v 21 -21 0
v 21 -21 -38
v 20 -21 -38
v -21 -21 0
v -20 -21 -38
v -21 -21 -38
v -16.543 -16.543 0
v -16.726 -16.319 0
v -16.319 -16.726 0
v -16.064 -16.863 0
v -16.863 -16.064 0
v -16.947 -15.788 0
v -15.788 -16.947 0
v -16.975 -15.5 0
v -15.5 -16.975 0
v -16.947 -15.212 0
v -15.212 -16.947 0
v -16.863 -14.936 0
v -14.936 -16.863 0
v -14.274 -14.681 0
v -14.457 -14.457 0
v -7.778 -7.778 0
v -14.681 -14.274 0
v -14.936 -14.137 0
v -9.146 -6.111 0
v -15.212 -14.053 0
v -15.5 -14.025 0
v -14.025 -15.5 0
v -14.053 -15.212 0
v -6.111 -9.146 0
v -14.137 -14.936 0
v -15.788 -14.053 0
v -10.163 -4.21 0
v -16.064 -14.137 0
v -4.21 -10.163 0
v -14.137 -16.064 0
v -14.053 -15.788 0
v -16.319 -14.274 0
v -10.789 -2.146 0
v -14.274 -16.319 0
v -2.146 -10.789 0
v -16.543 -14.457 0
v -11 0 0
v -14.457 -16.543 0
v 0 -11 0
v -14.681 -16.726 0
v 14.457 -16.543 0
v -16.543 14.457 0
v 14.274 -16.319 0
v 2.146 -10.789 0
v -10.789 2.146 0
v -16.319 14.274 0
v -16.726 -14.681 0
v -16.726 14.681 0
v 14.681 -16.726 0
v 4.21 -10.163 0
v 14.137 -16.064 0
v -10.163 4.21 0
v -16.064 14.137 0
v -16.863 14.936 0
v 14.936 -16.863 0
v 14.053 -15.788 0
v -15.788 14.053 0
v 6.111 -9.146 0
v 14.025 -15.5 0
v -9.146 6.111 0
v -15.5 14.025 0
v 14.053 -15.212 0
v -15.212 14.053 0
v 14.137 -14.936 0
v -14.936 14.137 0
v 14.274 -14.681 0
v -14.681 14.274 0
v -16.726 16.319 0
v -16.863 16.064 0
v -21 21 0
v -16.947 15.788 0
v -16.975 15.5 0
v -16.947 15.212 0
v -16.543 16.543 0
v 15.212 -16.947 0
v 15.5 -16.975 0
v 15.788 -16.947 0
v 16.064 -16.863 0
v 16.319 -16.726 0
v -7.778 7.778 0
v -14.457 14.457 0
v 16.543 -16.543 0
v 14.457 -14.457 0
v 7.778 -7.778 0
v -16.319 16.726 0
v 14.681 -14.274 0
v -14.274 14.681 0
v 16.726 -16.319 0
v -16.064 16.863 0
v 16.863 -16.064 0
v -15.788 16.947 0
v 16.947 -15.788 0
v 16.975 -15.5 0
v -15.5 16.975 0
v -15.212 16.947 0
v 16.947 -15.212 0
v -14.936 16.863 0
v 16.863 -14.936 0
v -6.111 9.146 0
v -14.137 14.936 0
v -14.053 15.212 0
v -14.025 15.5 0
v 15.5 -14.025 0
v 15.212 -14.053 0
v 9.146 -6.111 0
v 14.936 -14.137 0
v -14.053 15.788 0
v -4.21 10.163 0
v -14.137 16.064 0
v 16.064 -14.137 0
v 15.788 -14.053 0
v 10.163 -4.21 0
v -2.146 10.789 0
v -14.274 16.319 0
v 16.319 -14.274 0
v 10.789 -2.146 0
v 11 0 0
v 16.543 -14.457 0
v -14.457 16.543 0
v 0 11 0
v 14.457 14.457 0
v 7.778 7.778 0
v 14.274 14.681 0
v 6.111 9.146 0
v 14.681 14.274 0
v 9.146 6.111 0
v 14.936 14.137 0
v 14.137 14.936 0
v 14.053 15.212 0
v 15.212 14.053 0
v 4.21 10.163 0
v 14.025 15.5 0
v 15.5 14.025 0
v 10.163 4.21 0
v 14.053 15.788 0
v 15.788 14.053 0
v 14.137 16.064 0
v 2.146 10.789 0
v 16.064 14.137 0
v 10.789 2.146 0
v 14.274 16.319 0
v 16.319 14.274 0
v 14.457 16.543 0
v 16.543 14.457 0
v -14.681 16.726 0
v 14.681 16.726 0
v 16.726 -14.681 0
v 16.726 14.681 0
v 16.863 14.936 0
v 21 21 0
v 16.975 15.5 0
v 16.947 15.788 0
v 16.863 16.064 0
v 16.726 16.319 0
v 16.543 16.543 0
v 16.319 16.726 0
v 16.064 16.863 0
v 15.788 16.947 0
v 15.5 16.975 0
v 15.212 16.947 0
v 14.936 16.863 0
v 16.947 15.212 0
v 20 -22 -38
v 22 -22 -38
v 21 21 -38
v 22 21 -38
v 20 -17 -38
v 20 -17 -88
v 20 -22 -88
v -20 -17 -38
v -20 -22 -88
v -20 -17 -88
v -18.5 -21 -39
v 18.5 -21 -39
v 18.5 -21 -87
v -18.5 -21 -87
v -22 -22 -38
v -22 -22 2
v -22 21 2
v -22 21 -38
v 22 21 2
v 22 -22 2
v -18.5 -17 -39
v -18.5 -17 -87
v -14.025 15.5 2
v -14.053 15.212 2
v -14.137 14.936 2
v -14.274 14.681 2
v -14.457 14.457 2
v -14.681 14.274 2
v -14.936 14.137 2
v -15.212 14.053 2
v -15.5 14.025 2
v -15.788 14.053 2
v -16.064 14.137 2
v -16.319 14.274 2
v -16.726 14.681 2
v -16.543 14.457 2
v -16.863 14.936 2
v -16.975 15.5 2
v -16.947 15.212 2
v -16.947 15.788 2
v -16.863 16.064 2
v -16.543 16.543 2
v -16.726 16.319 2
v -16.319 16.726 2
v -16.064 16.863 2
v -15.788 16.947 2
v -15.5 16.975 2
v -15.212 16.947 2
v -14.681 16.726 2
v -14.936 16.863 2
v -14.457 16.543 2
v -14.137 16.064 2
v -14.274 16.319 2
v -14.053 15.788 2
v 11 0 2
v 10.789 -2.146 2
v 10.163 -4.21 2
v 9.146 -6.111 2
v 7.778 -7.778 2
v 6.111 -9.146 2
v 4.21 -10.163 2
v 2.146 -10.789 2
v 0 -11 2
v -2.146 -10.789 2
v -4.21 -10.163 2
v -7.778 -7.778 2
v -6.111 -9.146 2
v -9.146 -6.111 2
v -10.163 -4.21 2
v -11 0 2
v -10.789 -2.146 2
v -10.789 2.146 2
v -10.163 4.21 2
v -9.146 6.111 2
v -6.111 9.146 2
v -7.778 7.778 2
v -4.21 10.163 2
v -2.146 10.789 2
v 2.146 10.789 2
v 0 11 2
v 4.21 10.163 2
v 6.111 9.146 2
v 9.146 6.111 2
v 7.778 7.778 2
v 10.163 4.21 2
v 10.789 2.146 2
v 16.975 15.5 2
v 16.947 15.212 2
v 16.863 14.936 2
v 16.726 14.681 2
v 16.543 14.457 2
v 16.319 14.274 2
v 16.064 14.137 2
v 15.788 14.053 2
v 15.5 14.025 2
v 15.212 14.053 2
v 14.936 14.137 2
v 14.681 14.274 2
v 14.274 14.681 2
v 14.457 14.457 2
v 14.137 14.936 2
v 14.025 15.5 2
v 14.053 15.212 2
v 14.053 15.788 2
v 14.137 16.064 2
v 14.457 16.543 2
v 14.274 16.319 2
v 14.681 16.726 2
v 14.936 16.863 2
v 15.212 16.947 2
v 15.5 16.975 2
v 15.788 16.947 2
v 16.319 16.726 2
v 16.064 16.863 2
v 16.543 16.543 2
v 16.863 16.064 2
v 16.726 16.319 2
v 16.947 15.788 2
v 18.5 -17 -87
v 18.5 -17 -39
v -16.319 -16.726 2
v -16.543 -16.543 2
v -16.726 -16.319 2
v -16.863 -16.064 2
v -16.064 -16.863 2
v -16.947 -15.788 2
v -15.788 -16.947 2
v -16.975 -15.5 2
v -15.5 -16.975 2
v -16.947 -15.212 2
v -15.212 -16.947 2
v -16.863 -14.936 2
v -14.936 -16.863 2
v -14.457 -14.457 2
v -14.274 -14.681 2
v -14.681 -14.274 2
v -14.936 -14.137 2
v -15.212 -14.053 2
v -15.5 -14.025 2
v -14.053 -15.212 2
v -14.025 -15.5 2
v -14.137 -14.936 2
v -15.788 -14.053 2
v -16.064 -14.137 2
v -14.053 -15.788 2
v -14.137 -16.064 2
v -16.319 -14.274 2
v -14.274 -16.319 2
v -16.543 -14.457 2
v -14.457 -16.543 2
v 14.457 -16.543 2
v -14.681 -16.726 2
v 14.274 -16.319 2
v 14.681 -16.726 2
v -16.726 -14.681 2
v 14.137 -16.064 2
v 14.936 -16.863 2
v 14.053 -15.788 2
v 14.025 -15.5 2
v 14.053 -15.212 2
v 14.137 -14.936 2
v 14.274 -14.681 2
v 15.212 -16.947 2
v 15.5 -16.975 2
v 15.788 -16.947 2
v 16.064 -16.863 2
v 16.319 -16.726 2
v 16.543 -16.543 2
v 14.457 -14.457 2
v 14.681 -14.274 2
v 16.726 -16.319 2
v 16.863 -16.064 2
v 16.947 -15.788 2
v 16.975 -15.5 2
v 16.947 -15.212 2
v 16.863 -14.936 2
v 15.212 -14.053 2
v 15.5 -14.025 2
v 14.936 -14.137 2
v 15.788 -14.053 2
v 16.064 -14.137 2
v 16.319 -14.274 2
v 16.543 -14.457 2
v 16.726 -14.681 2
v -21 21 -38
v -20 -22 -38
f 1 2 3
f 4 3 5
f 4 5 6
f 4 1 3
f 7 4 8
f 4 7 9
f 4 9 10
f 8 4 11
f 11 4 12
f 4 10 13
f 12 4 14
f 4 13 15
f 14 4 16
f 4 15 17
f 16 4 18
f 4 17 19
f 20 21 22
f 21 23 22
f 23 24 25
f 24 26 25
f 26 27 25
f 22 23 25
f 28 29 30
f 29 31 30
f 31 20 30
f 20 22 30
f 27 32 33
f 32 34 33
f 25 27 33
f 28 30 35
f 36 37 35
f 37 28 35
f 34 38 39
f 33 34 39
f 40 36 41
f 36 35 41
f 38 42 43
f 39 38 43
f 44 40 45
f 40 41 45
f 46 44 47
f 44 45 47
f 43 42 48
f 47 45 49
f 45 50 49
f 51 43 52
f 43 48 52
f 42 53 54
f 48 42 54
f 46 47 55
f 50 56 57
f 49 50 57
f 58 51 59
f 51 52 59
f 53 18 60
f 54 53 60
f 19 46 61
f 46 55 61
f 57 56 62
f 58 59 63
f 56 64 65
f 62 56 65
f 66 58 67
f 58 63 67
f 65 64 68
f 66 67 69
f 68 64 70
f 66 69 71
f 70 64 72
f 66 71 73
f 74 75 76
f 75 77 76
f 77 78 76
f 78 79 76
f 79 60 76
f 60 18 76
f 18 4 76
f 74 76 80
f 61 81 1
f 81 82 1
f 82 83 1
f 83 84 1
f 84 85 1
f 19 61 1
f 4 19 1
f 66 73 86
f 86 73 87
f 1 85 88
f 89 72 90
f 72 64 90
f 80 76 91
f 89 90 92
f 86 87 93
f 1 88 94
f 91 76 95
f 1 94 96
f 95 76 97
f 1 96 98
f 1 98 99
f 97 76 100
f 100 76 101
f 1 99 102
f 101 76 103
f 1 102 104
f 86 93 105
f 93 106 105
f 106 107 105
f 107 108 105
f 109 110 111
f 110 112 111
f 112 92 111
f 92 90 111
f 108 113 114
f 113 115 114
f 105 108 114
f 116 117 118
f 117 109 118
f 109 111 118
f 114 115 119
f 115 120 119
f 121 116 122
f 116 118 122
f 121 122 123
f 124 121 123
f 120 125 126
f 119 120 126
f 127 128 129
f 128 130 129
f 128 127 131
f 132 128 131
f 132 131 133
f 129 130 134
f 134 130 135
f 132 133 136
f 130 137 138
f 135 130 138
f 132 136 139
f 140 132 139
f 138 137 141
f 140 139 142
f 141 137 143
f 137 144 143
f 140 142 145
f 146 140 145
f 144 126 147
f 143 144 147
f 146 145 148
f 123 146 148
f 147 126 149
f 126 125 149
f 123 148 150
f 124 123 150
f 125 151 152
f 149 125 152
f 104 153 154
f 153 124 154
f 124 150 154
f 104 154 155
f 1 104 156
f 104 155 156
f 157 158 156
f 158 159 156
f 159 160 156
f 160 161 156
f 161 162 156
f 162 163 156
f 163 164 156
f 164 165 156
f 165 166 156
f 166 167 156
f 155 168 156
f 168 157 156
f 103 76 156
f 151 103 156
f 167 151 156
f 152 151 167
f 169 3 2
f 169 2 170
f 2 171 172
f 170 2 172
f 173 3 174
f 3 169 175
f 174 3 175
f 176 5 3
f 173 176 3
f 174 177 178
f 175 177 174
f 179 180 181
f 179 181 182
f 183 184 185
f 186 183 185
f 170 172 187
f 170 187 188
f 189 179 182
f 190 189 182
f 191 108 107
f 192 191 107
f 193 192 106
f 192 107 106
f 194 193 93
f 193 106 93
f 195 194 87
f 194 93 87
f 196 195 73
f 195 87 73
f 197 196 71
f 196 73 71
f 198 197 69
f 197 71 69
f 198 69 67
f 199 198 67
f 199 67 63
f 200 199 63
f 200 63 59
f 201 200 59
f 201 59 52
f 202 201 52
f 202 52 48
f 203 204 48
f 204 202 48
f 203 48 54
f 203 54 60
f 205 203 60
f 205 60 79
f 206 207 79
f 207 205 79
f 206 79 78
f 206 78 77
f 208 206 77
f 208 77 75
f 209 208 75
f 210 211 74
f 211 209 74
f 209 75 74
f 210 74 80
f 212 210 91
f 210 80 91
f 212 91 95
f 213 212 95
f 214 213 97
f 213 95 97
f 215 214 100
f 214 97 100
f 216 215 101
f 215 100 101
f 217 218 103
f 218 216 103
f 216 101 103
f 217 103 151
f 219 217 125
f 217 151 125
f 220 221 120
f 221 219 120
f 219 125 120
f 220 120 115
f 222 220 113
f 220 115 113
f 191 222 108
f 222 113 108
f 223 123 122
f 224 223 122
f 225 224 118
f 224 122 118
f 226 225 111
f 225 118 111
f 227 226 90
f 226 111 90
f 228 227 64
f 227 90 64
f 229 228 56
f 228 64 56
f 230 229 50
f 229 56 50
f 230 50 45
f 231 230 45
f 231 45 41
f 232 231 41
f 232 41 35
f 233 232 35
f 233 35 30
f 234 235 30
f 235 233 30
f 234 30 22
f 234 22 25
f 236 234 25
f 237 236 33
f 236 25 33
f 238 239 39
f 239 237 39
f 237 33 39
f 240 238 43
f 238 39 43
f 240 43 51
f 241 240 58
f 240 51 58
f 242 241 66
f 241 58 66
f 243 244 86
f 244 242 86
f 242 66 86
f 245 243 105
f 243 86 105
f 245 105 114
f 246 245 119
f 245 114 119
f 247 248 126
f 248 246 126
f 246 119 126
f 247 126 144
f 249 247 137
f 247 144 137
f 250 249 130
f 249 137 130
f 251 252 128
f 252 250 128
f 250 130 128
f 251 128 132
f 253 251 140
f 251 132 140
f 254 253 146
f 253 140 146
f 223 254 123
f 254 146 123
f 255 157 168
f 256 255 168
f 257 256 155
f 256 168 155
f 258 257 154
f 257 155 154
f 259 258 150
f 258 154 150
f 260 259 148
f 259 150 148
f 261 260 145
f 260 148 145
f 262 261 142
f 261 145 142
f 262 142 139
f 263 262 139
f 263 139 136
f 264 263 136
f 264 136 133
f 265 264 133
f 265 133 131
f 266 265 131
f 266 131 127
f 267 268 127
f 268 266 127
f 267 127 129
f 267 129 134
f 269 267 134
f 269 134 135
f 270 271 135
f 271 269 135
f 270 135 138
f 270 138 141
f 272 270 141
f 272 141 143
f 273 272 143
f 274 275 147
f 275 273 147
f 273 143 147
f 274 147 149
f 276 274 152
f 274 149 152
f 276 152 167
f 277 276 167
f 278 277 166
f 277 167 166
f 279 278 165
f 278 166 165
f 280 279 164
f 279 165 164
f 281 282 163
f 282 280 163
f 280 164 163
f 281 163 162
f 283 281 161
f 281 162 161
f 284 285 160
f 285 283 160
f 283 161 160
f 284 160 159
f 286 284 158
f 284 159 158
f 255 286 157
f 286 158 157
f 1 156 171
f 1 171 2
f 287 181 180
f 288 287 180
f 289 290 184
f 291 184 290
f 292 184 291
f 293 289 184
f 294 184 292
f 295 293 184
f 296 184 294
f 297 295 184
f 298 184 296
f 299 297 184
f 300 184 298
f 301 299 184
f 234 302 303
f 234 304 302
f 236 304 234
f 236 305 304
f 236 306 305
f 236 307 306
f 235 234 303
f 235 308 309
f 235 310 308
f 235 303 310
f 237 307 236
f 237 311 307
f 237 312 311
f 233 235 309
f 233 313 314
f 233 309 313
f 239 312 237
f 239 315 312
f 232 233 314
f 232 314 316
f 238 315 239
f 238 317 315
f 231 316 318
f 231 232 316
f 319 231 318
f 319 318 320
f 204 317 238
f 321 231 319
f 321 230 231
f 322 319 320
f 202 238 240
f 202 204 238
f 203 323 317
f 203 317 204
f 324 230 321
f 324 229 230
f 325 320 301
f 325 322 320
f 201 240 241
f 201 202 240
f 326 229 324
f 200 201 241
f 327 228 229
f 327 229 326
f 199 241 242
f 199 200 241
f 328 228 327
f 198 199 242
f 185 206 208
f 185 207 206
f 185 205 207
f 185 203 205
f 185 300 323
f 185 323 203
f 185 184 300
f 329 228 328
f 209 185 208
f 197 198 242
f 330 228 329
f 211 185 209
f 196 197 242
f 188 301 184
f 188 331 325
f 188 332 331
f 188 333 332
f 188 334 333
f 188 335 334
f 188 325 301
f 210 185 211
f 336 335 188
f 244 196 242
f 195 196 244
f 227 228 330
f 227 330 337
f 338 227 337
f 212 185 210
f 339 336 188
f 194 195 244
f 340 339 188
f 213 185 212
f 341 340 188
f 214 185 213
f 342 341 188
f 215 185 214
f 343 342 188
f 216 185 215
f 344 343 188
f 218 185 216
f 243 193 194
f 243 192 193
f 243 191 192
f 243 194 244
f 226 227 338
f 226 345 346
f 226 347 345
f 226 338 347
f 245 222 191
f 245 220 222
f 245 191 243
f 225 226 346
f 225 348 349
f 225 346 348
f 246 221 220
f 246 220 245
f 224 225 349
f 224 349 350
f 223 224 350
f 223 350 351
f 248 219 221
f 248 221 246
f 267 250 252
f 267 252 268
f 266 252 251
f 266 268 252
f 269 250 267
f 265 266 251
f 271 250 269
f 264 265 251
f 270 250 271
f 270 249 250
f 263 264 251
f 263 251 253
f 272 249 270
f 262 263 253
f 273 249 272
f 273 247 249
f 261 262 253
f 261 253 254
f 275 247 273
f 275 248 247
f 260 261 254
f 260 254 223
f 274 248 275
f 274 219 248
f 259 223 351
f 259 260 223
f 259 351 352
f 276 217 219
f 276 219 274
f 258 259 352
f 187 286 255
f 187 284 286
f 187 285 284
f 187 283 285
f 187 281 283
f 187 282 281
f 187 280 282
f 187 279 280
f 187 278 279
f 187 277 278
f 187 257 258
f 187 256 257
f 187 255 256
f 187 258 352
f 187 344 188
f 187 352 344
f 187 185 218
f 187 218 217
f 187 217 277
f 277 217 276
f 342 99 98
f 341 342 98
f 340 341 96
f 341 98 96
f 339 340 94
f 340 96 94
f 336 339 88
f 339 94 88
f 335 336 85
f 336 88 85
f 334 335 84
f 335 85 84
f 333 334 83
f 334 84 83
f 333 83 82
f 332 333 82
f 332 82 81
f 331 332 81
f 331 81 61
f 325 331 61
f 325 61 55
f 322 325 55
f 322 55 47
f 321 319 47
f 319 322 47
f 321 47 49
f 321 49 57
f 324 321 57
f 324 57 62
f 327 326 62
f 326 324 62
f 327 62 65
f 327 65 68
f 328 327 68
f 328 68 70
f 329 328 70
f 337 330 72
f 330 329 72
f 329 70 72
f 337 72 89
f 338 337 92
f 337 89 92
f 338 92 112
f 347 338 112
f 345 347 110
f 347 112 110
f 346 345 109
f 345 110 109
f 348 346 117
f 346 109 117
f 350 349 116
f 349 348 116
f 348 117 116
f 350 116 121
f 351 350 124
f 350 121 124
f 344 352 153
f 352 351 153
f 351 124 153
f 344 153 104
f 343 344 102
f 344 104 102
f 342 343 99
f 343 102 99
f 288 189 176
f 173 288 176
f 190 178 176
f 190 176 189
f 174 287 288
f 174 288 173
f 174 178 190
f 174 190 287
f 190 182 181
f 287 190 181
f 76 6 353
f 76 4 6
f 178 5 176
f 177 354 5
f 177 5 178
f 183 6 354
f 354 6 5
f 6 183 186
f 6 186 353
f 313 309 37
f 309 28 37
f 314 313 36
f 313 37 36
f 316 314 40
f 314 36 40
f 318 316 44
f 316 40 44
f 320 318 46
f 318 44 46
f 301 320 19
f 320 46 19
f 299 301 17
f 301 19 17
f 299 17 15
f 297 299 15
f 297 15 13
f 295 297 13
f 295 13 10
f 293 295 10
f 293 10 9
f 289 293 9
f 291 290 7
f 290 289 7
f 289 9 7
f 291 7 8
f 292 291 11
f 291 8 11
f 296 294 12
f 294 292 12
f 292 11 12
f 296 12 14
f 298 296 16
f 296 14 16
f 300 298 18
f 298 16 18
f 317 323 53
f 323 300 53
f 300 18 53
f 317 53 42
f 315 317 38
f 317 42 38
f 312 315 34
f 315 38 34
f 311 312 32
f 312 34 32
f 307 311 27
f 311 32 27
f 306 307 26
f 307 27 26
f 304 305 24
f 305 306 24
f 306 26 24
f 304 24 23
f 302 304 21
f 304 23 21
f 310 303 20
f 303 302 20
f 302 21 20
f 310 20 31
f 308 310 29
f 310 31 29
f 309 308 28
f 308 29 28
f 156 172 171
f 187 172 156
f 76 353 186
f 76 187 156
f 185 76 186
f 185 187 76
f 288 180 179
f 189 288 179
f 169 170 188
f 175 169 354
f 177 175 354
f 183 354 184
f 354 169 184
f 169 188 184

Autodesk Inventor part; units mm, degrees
ref_plane "YZ Plane" through (0, 0, 0) normal (1, 0, 0) x (0, 1, 0)
ref_plane "XZ Plane" through (0, 0, 0) normal (0, 1, 0) x (-1, 0, 0)
ref_plane "XY Plane" through (0, 0, 0) normal (0, 0, 1) x (1, 0, 0)
sketch "Sketch1" plane through (0, 0, 0) normal (0, 0, 1) x (1, 0, 0)
  line L0 (-22, 22) -> (22, 22)
  line L1 (22, 22) -> (22, -22)
  line L2 (22, -22) -> (-22, -22)
  line L3 (-22, -22) -> (-22, 22)
  circle A0 centre (15.5, 15.5) radius 1.475
  circle A1 centre (-15.5, 15.5) radius 1.475
  circle A2 centre (15.5, -15.5) radius 1.475
  circle A3 centre (-15.5, -15.5) radius 1.475
  line L4 (-15.5, 15.5) -> (15.5, 15.5) construction
  line L5 (15.5, 15.5) -> (15.5, -15.5) construction
  circle A4 centre (0, 0) radius 11
  line L6 (-21, 21) -> (21, 21)
  line L7 (21, 21) -> (21, -21)
  line L8 (21, -21) -> (-21, -21)
  line L9 (-21, -21) -> (-21, 21)
  line L10 (21, 21) -> (22, 21)
  line L11 (-21, 21) -> (-22, 21)
  point P0 (0, 22)
  point P1 (22, 0)
  point P2 (15.5, 0)
  point P3 (0, 15.5)
  point P4 (0, 21)
  point P5 (21, 0)
  dimension "d0" = 44
  dimension "d1" = 2.95
  dimension "d4" = 31
  dimension "d7" = 31
  dimension "d10" = 22
  dimension "d11" = 42
extrude "Extrusion1" add sketch "Sketch1" along normal blind 2 contours L11 L9 L8 L7 L10 L1 L2 L3 | L6 L7 L8 L9
extrude "Extrusion2" add sketch "Sketch1" against normal blind 38 contours L11 L9 L8 L7 L10 L1 L2 L3
sketch "Sketch2" plane through (0, 0, -38) normal (0, 0, -1) x (-1, 0, 0)
  line L0 (21, -21) -> (21, 21) projected
  line L1 (21, -21) -> (22, -21)
  line L2 (22, 21) -> (22, -22) projected
  line L3 (-21, -21) -> (-21, 21) projected
  line L4 (-21, -21) -> (-22, -21)
  line L5 (-22, 21) -> (-22, -22) projected
  line L6 (21, -21) -> (-21, -21) projected
  line L7 (-22, -22) -> (22, -22) projected
  line L8 (-20, -21) -> (-20, -22)
  line L9 (20, -21) -> (20, -22)
  line L10 (-20, -21.5) -> (20, -21.5) construction
  point P0 (0, 0)
  point P1 (0, -21.5)
  dimension "d16" = 40
extrude "Extrusion3" add sketch "Sketch2" along normal blind 50 contours L9 L7 L8 L6
sketch "Sketch3" plane through (-21, -21, 0) normal (0, 1, 0) x (1, 0, 0)
  line L0 (42, 0) -> (0, 0) projected
  line L1 (42, 0) -> (42, 38) projected
  line L2 (41, 38) -> (42, 38) projected
  line L3 (41, 38) -> (41, 88) projected
  line L4 (1, 88) -> (41, 88) projected
  line L5 (1, 38) -> (1, 88) projected
  line L6 (0, 38) -> (1, 38) projected
  line L7 (0, 0) -> (0, 38) projected
  line L8 (1, 38) -> (41, 38)
  line L9 (2.5, 87) -> (39.5, 87)
  line L10 (39.5, 87) -> (39.5, 39)
  line L11 (39.5, 39) -> (2.5, 39)
  line L12 (2.5, 39) -> (2.5, 87)
  point P0 (21, 0)
  point P1 (21, 87)
  point P2 (21, 88)
  point P3 (39.5, 63)
  point P4 (41, 63)
  dimension "d19" = 48
  dimension "d20" = 37
extrude "Extrusion4" add sketch "Sketch3" along normal blind 4 contours L8 L5 L4 L3
properties part number "Motor Stand"
